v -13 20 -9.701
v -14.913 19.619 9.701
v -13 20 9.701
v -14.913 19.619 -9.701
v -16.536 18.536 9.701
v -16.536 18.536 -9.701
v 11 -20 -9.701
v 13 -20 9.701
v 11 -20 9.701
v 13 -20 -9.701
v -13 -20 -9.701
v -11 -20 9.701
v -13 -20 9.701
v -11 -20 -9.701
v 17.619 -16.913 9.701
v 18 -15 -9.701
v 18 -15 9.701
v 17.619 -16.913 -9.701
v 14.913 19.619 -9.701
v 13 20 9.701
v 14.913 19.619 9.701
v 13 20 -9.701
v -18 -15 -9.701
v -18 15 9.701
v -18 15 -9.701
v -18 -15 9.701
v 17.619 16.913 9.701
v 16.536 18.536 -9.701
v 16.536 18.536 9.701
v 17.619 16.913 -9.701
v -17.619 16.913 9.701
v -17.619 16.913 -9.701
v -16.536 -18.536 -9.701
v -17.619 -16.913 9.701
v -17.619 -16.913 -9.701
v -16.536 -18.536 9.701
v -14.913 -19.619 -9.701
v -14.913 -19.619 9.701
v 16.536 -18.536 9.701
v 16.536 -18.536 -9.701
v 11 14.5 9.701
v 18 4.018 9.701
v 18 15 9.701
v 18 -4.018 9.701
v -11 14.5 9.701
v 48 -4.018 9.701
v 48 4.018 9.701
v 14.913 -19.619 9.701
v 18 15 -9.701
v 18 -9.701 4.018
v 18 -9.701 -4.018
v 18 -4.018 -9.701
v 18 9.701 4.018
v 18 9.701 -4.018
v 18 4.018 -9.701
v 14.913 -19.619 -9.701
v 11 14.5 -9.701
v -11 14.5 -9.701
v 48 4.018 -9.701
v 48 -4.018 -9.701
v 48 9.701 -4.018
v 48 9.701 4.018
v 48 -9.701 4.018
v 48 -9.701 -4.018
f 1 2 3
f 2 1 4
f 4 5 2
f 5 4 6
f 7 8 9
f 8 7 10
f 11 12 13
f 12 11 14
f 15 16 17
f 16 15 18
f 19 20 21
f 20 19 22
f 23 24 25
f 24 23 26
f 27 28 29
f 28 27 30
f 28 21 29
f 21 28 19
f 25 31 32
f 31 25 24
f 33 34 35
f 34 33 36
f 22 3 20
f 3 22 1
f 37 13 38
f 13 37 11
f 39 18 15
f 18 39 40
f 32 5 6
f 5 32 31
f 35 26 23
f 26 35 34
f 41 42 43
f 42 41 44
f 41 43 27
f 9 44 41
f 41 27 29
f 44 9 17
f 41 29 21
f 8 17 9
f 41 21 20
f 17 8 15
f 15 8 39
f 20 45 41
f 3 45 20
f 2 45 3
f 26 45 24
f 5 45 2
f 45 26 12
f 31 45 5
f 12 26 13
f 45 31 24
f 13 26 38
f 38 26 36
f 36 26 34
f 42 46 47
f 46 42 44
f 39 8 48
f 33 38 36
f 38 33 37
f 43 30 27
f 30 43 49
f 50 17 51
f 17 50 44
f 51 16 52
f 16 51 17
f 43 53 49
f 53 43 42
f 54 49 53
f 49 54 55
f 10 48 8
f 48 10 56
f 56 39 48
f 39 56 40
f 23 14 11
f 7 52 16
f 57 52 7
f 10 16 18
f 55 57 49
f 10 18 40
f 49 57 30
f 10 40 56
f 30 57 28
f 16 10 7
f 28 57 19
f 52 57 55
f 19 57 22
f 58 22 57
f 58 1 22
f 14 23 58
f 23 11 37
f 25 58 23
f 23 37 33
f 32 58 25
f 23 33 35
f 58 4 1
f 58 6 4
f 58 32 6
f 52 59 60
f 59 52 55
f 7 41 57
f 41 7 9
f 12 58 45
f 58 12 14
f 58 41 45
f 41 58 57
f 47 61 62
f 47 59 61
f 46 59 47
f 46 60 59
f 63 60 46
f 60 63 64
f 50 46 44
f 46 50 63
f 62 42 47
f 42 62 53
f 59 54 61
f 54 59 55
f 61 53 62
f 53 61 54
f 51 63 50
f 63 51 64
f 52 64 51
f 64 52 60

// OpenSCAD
//this is a Delta hard drive Bearring Mount for the top of the printer arm piece
make_arm();

module make_arm(pvc_inner_radius=10.5, arm_length=30){
  //find the distance between sides to properly size clamp
  angle = 67.5; //angle of octogon
  side =  (2*pvc_inner_radius)*cos(angle);//each side of the octogon is equal to "c*cos(t)" where "c" is the diameter of the octogon
  x = side/(sqrt(2));
  distance_from_sides = 2*x+side;
  //lay octogon on its side and position next to clamp
  union(){
    rotate([22.5,0,0]){
      rotate([0,90,0]){
        translate([0,0,18]){
          cylinder(h = arm_length, r1=pvc_inner_radius, r2 = pvc_inner_radius, $fn=8);
    };};};
    difference(){
      translate([-(36/2),-(40/2), -(distance_from_sides/2)]){
        roundedcube(36, 40,distance_from_sides,5);
        //rounded2(36, 40,distance_from_sides,5);
      };
      translate([0,-3,0]){
        cube([22, 35, 22], center=true);};
    };
  };
};

module roundedcube(xdim ,ydim ,zdim,rdim){
  hull(){
    translate([rdim,rdim,0])cylinder(h=zdim,r=rdim);
    translate([xdim-rdim,rdim,0])cylinder(h=zdim,r=rdim);
    translate([rdim,ydim-rdim,0])cylinder(h=zdim,r=rdim);
    translate([xdim-rdim,ydim-rdim,0])cylinder(h=zdim,r=rdim);
   };
};
